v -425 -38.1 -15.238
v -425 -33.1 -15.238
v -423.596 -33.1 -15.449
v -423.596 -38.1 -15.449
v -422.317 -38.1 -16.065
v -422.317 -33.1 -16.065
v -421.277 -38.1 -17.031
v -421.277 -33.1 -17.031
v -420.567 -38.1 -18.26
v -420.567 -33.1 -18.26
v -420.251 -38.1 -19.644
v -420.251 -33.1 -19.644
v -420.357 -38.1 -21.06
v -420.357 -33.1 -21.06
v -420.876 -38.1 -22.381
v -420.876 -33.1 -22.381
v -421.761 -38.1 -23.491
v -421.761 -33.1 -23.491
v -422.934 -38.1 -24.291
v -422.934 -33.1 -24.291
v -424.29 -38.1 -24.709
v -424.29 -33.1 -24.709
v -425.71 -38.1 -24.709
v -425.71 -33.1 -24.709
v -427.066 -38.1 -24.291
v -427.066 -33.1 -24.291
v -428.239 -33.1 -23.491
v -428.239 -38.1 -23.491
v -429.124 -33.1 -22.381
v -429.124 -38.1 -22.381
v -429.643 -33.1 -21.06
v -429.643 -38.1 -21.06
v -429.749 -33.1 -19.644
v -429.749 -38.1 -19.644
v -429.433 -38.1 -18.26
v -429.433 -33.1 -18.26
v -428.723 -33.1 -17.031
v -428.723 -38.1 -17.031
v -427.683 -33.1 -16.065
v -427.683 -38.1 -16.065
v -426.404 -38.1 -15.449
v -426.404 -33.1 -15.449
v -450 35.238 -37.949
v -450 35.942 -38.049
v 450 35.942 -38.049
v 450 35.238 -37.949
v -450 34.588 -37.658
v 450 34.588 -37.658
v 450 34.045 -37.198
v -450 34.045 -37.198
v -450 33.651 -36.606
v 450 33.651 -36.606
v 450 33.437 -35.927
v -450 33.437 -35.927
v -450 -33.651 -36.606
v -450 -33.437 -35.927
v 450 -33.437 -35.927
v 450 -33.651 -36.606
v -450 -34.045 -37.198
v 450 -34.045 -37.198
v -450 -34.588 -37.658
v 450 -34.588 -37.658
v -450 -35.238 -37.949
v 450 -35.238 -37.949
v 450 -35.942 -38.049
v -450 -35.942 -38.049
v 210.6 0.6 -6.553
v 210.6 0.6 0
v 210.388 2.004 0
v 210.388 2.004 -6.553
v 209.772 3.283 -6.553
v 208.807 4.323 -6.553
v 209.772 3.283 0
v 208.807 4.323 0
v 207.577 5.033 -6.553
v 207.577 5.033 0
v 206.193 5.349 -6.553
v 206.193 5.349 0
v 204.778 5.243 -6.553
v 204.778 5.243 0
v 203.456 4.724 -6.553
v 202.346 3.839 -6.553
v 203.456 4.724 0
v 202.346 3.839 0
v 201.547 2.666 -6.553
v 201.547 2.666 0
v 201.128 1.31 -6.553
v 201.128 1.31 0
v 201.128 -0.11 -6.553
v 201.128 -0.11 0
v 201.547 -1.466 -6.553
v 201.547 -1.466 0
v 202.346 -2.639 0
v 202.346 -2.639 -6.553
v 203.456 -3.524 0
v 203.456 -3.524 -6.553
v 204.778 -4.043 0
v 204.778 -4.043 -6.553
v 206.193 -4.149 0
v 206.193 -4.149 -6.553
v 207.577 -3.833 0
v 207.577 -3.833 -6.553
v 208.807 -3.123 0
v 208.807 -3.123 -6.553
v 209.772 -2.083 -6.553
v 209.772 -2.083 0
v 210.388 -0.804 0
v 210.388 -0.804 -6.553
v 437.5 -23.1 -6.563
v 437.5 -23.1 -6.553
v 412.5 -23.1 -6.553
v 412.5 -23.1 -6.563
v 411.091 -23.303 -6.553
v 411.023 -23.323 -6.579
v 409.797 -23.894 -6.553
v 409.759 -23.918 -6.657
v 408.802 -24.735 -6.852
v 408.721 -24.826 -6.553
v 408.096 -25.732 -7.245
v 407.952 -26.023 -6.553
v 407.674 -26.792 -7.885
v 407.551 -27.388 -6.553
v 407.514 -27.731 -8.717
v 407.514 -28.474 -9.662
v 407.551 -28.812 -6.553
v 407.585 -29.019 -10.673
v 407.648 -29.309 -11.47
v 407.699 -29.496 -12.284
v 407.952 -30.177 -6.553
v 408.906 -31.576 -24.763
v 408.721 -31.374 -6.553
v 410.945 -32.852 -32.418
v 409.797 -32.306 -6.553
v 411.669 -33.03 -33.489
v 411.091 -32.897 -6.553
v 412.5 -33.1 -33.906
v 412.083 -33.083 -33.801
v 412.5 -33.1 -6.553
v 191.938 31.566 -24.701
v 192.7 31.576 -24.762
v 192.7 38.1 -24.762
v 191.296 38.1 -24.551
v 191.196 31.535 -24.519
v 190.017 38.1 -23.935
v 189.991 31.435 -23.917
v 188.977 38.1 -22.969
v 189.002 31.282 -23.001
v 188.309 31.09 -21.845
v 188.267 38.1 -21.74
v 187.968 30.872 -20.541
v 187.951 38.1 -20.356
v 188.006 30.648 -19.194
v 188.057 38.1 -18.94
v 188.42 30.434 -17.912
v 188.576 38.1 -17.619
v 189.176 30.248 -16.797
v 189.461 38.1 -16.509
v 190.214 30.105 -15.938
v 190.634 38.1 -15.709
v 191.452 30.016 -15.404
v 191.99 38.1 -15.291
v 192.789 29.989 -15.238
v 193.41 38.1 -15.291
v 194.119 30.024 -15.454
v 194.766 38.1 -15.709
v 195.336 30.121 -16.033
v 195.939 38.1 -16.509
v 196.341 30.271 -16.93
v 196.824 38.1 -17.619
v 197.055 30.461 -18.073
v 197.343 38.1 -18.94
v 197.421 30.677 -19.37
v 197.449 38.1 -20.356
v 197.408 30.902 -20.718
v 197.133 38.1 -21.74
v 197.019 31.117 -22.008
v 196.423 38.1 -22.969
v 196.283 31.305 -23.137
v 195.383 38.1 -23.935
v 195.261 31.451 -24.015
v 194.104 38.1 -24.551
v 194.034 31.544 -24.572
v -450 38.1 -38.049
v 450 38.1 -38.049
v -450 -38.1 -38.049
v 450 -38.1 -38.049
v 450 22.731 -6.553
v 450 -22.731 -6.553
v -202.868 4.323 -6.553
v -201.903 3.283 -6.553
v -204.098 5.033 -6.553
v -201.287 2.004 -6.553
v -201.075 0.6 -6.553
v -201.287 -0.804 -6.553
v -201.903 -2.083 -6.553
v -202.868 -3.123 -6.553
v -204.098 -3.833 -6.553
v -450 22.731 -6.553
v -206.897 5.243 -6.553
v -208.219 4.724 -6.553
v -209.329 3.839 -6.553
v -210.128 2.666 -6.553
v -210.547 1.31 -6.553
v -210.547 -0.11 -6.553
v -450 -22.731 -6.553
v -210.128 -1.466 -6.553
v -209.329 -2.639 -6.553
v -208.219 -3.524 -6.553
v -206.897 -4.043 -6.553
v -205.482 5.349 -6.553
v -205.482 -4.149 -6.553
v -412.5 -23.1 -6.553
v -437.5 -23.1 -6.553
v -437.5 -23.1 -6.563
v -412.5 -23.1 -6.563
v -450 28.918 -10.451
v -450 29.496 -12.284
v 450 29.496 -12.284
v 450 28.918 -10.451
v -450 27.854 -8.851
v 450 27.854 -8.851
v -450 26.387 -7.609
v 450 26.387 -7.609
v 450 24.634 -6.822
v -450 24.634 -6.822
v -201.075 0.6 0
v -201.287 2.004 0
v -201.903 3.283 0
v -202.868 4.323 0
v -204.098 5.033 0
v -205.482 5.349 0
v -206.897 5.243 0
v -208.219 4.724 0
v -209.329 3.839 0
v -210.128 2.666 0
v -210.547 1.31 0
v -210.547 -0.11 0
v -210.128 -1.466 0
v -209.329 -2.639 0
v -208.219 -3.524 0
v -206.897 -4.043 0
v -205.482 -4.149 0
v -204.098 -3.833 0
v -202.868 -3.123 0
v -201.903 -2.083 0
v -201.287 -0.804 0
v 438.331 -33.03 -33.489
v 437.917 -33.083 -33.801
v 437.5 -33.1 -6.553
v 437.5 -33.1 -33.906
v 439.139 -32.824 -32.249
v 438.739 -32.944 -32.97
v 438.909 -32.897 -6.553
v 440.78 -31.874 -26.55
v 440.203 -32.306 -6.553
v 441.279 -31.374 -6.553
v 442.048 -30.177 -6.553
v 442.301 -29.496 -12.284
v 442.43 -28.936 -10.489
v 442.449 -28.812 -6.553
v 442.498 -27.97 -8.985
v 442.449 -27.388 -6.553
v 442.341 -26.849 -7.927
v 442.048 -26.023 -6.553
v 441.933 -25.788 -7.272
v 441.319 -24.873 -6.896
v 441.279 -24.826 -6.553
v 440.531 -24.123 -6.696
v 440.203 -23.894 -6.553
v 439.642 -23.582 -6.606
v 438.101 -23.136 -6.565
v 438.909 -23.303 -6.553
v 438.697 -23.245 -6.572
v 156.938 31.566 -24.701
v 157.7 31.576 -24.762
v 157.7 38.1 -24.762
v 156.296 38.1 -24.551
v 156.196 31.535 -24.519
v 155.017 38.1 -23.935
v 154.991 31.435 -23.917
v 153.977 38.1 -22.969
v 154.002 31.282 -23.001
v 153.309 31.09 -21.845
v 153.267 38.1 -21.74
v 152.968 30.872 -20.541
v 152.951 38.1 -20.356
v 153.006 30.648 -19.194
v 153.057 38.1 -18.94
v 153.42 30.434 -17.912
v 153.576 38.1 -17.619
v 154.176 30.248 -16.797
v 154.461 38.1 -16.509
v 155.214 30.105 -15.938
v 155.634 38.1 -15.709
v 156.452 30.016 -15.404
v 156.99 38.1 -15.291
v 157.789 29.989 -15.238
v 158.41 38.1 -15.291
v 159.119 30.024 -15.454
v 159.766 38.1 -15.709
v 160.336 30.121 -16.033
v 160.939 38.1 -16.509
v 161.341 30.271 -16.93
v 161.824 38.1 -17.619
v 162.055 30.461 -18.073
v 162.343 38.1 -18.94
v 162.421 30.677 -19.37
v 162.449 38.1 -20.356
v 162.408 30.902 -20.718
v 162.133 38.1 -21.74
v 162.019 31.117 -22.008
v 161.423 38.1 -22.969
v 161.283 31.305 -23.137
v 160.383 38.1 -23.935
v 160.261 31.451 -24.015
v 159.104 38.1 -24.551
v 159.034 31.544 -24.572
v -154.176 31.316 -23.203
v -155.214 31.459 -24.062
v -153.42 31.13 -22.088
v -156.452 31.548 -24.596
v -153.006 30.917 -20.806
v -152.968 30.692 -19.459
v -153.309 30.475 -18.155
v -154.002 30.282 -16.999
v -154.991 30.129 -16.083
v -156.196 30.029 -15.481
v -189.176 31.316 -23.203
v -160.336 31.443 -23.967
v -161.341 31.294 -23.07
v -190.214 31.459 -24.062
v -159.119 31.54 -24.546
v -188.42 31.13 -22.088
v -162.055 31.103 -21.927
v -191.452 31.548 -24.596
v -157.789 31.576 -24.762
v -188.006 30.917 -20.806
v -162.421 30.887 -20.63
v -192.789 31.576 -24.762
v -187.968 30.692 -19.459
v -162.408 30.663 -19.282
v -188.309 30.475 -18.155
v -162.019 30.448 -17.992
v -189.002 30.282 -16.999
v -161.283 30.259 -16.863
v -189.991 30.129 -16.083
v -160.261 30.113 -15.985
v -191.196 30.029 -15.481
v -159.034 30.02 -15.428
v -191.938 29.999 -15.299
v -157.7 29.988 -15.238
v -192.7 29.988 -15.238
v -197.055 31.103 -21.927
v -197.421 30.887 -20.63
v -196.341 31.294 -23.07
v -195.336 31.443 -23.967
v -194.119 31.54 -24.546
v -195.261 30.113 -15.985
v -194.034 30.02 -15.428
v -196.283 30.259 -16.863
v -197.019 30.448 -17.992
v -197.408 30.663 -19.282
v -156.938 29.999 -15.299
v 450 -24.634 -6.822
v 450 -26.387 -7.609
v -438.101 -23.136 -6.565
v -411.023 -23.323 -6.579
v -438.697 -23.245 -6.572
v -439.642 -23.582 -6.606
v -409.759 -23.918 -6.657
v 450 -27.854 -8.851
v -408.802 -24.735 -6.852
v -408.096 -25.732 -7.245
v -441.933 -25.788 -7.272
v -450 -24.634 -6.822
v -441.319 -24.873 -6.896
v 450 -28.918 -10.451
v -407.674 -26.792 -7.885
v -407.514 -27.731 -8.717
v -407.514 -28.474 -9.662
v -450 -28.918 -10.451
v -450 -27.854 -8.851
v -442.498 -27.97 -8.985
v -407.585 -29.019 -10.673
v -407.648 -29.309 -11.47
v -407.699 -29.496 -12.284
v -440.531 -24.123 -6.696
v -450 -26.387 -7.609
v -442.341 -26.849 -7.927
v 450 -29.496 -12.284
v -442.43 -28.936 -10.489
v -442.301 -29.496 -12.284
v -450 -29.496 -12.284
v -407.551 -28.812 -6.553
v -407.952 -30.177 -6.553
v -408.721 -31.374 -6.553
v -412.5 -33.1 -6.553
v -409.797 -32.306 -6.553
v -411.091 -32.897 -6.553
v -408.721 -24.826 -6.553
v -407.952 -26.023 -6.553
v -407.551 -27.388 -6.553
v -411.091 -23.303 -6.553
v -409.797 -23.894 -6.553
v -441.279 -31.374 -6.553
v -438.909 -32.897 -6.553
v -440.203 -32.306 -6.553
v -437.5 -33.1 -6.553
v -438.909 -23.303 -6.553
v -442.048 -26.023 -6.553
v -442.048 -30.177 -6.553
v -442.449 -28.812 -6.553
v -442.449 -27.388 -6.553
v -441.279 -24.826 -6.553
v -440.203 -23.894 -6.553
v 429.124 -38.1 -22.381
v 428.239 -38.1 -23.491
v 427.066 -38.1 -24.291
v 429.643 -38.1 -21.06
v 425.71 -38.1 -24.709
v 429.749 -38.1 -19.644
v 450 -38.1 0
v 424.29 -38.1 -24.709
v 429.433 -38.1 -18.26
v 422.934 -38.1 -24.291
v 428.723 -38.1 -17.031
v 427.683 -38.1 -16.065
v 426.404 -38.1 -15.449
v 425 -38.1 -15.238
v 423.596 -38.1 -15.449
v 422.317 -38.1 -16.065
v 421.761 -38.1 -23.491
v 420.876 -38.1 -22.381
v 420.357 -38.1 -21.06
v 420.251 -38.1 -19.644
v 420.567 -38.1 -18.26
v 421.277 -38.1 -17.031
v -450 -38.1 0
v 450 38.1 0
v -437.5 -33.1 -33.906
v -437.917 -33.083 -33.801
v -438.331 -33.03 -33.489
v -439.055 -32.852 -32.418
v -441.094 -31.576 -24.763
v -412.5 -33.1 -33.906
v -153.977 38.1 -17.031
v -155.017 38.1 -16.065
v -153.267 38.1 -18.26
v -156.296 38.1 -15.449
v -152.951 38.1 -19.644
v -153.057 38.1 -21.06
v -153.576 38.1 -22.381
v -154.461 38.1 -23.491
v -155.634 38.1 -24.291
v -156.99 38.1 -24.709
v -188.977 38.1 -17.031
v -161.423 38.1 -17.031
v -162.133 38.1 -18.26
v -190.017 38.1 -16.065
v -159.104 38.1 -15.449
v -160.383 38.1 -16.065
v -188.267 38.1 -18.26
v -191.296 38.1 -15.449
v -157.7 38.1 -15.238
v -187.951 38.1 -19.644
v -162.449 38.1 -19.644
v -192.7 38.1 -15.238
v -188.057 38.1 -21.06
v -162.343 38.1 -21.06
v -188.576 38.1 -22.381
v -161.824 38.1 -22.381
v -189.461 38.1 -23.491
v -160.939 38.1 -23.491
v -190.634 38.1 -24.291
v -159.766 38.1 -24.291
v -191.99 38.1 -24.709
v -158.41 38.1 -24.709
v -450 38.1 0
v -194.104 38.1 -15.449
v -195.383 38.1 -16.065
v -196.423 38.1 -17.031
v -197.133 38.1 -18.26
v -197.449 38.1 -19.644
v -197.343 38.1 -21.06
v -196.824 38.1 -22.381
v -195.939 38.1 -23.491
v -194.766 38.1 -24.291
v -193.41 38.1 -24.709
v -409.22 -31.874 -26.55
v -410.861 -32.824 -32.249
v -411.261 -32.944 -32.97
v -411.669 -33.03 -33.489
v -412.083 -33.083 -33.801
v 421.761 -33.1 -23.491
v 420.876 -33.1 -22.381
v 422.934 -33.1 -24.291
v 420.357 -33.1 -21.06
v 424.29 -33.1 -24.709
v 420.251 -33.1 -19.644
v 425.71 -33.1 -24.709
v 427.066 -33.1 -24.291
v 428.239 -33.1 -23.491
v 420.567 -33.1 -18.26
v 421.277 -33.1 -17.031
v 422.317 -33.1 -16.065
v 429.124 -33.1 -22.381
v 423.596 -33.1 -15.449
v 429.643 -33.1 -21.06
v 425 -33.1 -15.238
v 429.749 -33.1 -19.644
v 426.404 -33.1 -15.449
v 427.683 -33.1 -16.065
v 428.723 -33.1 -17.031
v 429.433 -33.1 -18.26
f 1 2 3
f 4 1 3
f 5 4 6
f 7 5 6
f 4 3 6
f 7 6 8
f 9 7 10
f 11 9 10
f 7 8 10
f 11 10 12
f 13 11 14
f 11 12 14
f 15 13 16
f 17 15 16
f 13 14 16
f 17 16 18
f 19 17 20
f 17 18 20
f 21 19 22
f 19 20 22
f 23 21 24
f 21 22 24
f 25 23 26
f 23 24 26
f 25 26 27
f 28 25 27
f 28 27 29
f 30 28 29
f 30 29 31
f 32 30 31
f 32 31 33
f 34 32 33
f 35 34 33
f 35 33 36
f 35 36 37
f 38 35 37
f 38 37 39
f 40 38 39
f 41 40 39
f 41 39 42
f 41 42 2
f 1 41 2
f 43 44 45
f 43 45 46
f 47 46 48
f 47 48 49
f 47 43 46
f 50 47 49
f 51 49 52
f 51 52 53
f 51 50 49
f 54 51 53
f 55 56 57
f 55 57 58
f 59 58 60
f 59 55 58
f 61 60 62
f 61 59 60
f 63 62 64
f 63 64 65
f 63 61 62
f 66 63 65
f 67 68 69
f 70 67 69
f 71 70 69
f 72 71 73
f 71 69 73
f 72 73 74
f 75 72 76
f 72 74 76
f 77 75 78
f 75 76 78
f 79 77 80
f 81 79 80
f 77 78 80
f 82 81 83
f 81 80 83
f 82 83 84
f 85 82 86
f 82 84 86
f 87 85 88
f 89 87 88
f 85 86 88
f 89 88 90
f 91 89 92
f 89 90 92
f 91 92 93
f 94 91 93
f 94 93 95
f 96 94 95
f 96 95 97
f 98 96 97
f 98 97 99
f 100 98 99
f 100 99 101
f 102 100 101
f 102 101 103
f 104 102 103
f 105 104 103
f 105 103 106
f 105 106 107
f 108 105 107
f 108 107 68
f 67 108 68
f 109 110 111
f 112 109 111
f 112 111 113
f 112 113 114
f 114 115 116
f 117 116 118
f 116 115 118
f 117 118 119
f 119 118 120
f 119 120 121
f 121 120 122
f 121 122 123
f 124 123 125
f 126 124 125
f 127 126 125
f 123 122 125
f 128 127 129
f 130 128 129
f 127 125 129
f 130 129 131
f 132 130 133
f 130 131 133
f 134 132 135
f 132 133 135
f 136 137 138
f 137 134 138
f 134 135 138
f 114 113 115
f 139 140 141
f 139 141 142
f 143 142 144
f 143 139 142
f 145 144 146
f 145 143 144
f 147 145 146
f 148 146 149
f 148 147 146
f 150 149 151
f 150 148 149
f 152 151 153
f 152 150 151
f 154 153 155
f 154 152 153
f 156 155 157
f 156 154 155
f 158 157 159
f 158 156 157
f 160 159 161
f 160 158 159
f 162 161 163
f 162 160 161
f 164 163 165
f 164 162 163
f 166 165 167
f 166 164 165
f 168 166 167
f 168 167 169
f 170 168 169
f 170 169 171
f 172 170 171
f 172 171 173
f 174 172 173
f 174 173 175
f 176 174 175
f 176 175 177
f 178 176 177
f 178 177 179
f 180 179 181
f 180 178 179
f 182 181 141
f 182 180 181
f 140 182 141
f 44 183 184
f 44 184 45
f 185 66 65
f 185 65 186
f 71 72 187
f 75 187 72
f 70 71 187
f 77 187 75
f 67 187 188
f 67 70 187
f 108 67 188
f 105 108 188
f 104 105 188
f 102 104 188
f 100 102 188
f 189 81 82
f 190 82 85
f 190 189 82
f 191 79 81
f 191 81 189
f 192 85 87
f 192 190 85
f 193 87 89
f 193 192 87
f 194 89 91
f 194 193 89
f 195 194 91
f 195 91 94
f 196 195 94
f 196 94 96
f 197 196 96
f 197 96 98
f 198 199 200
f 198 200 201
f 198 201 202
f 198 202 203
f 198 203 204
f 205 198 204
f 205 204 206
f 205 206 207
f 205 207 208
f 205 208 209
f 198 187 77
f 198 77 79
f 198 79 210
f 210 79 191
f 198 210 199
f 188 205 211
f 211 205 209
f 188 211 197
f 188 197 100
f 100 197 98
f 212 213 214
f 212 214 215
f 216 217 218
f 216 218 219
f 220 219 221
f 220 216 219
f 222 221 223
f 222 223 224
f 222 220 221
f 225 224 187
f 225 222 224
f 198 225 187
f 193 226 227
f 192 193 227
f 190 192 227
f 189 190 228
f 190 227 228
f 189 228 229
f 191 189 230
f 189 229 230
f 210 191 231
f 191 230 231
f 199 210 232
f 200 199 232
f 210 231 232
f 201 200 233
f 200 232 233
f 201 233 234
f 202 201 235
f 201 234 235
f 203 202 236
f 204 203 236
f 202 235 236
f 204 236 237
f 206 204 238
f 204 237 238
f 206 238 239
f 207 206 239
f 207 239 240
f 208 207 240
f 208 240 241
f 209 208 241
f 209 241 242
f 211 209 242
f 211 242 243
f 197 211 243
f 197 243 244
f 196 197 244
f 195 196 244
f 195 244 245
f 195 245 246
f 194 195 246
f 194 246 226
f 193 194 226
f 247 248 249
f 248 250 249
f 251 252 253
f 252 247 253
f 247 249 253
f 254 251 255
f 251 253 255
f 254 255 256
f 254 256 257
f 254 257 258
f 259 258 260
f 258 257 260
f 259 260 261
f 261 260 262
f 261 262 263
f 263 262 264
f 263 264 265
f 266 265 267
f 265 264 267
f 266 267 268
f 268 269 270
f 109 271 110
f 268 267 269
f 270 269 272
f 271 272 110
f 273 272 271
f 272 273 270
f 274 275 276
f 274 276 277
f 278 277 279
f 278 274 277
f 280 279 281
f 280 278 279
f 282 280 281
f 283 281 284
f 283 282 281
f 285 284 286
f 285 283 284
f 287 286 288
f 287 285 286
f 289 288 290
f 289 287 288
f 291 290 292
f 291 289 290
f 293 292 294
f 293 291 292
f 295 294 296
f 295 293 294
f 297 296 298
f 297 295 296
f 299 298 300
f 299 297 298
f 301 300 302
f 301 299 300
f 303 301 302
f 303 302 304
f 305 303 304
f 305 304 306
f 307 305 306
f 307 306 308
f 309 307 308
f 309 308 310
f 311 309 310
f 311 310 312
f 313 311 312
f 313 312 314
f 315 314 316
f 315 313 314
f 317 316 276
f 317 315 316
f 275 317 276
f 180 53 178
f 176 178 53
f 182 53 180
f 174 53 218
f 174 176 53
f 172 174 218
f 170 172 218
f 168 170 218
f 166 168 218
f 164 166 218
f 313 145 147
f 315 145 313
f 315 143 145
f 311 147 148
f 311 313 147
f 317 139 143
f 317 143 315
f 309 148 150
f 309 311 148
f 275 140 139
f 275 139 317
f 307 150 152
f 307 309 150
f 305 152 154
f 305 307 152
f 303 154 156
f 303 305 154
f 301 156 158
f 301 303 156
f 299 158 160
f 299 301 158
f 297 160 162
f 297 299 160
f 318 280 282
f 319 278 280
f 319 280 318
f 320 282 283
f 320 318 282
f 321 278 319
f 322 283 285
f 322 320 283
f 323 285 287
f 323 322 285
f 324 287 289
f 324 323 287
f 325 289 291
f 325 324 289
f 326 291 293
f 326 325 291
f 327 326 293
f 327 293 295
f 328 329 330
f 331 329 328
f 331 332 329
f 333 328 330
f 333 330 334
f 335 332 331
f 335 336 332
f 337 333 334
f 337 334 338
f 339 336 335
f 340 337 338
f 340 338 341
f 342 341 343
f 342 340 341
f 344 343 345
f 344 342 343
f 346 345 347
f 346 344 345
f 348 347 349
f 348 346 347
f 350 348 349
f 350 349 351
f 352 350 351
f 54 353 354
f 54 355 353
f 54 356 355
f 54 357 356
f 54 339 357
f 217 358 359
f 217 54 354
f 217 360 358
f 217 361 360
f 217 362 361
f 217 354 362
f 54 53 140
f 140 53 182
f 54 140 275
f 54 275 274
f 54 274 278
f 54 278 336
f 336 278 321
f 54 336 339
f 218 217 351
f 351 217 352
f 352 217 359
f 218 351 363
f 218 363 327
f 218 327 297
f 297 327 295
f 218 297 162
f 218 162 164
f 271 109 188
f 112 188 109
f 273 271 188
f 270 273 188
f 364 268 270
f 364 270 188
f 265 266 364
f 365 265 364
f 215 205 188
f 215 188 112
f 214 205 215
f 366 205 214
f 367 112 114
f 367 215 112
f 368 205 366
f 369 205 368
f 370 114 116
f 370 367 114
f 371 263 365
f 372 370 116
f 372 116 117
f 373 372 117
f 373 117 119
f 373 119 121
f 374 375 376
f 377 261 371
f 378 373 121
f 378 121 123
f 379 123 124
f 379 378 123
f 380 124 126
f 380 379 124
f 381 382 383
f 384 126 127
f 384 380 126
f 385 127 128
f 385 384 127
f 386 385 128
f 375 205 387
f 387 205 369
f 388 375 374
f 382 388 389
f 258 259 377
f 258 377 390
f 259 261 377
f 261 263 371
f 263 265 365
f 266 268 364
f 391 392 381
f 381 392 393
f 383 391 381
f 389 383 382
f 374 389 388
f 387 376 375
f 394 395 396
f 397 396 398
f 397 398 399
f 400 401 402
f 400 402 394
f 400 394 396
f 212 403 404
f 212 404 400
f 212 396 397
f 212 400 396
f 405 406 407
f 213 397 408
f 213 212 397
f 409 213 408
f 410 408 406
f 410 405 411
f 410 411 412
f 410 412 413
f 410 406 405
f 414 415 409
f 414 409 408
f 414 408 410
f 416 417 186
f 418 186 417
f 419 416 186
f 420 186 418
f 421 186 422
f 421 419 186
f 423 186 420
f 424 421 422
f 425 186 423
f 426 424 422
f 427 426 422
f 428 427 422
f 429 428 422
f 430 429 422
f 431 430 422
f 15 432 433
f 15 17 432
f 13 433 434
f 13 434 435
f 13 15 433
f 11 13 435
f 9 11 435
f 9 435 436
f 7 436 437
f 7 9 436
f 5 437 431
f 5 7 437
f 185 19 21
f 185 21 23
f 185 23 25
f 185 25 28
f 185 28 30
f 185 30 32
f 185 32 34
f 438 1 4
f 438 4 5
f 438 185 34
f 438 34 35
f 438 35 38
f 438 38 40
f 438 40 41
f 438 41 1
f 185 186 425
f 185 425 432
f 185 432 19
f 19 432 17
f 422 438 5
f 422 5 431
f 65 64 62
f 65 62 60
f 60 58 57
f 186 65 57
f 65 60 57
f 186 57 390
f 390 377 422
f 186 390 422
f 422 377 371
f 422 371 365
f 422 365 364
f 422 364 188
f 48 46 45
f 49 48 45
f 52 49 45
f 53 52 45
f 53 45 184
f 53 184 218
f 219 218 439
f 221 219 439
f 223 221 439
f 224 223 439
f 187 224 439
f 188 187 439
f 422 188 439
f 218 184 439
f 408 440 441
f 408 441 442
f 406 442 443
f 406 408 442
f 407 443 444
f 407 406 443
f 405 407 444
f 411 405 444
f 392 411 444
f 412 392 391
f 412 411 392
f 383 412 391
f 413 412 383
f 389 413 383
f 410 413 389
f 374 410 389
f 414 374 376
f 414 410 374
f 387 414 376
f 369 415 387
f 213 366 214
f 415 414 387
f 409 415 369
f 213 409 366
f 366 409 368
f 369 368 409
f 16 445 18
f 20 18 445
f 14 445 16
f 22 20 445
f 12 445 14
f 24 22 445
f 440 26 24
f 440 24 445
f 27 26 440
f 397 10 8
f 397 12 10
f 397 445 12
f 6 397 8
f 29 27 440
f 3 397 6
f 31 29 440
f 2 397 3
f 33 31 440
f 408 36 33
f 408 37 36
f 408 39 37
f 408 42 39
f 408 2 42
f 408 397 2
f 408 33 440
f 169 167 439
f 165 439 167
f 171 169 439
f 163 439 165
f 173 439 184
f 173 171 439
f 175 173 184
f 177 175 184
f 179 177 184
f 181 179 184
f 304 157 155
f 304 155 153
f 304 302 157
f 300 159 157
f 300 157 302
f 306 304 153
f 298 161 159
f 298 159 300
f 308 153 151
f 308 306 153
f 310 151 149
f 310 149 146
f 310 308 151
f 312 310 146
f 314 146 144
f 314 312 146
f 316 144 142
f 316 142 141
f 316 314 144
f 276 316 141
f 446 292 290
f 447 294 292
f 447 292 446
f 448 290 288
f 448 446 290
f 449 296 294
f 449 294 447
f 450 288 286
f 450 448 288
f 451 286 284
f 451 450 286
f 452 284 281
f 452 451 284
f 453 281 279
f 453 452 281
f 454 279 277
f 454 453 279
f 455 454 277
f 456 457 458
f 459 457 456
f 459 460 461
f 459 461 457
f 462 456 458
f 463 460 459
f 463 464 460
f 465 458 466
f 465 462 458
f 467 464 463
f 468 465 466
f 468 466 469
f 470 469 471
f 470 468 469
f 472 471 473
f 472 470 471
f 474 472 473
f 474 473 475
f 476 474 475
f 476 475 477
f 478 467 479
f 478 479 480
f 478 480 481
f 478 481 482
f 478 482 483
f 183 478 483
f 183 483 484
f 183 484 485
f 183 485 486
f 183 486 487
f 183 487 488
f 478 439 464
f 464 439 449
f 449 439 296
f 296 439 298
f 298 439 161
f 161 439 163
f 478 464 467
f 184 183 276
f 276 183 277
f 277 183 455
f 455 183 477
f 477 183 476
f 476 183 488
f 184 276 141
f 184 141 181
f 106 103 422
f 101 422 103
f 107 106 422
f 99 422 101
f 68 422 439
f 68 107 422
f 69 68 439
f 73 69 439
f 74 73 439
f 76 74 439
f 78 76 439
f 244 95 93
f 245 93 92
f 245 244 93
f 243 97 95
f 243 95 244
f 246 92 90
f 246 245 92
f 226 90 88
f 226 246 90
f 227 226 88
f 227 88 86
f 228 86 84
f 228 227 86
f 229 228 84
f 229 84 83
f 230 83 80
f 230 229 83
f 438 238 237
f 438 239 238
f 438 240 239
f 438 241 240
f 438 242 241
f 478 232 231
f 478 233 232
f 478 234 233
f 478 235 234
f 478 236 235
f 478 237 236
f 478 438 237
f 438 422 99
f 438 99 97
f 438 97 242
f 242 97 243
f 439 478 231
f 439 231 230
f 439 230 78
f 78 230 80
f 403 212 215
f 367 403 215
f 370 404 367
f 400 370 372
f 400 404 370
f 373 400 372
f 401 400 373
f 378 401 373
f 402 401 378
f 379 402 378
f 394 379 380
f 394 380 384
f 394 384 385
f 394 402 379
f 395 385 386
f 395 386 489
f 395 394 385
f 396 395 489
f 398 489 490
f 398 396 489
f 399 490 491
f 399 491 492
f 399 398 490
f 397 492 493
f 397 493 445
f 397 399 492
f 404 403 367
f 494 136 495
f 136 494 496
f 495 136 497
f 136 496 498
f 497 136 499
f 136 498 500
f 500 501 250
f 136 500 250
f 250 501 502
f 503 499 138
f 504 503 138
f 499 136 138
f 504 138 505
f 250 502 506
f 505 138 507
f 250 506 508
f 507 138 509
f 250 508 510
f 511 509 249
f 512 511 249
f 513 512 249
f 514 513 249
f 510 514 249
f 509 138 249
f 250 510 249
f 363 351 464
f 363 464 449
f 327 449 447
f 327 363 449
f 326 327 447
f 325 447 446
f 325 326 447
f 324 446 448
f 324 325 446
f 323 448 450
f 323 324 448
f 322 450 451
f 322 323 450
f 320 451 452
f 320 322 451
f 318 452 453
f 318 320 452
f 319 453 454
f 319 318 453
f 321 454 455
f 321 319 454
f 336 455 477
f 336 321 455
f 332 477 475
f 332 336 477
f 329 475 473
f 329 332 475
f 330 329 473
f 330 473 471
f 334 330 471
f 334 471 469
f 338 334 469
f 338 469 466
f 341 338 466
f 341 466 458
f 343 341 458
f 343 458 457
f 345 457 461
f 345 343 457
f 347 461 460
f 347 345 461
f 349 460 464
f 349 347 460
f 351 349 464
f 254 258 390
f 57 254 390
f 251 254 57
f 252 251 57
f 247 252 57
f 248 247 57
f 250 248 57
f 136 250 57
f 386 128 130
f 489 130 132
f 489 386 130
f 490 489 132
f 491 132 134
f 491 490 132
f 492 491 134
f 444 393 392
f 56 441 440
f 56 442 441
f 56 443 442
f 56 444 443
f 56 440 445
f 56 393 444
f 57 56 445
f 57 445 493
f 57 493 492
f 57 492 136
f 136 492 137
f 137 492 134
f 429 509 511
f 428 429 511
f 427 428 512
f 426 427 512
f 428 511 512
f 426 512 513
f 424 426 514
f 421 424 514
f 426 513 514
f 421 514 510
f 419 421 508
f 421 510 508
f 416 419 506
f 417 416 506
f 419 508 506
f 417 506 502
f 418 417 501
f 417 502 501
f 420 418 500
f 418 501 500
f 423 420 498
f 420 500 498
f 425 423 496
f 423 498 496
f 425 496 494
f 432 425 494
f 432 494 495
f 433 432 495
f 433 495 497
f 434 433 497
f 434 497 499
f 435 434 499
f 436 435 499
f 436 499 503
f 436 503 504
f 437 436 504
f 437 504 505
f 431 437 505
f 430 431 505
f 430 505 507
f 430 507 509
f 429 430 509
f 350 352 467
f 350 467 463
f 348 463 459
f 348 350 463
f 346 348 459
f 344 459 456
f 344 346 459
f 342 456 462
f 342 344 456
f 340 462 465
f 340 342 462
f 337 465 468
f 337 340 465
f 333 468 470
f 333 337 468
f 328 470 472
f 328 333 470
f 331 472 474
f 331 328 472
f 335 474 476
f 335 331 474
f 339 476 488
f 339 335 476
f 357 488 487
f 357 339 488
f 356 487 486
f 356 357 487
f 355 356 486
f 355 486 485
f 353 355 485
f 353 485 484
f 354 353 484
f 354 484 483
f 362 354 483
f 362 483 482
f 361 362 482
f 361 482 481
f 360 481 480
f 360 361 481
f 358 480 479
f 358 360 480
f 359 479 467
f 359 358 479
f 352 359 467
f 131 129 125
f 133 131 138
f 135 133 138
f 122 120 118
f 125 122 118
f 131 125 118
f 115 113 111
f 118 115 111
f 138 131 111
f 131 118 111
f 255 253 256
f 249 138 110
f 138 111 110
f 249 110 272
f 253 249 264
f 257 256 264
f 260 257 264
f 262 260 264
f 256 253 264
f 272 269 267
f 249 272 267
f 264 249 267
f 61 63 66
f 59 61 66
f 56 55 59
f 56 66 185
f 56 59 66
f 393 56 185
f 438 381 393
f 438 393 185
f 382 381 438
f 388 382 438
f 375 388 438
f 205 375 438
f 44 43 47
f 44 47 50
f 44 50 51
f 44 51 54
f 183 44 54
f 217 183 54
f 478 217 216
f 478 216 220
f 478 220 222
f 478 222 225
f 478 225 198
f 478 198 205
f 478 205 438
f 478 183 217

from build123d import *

# Parameters (mm, degrees)
STRUCTURAL_MEMBER1_DEPTH = 900
SKETCH12_R               = 4.7625
CUT_EXTRUDE1_DEPTH       = 454.210052427
CUT_EXTRUDE2_DEPTH       = 40
SKETCH16_R               = 4.7625
CUT_EXTRUDE3_DEPTH       = 454.210052526
SKETCH17_R               = 4.7625
CUT_EXTRUDE4_DEPTH       = 454.210052526


with BuildPart() as part:
    # Sketch11 → Structural Member1 (new body)
    with BuildSketch(Plane(origin=(-450, 0, 0), x_dir=(0, 0, -1), z_dir=(1, 0, 0))):
        with BuildLine():
            Line((0, -38.1), (0, 38.1))
            Line((0, 38.1), (38.0492, 38.1))
            Line((38.0492, 38.1), (38.0492, 35.942335136))
            ThreePointArc((38.0492, 35.942335136), (37.447280466, 34.300554363), (35.926803066, 33.436899509))
            Line((35.926803066, 33.436899509), (12.283671721, 29.496090157))
            ThreePointArc((12.283671721, 29.496090157), (8.178382741, 27.164222052), (6.5532, 22.731413966))
            Line((6.5532, 22.731413966), (6.5532, -22.731413966))
            ThreePointArc((6.5532, -22.731413966), (8.178382741, -27.164222052), (12.283671721, -29.496090157))
            Line((12.283671721, -29.496090157), (35.926803066, -33.436899509))
            ThreePointArc((35.926803066, -33.436899509), (37.447280466, -34.300554363), (38.0492, -35.942335136))
            Line((38.0492, -35.942335136), (38.0492, -38.1))
            Line((38.0492, -38.1), (0, -38.1))
        make_face()
    extrude(amount=STRUCTURAL_MEMBER1_DEPTH)

    # Sketch12 → Cut-Extrude1 (cut, through all)
    with BuildSketch(Plane(origin=(0, 0, 0), x_dir=(1, 0, 0), z_dir=(0, 1, 0))):
        with Locations(Location((-425, 20, 0), (0, 0, 270))):
            Circle(SKETCH12_R)
        with Locations(Location((425, 20, 0), (0, 0, 270))):
            Circle(SKETCH12_R)
    extrude(amount=-CUT_EXTRUDE1_DEPTH, mode=Mode.SUBTRACT)

    # Sketch15 → Cut-Extrude2 (cut)
    with BuildSketch(Plane(origin=(0, 0, -6.5532), x_dir=(-1, 0, 0), z_dir=(0, 0, -1))):
        with BuildLine():
            Line((-412.5, -33.1), (-437.5, -33.1))
            ThreePointArc((-437.5, -33.1), (-442.5, -28.1), (-437.5, -23.1))
            Line((-437.5, -23.1), (-412.5, -23.1))
            ThreePointArc((-412.5, -23.1), (-407.5, -28.1), (-412.5, -33.1))
        make_face()
        with BuildLine():
            Line((412.5, -33.1), (437.5, -33.1))
            ThreePointArc((437.5, -33.1), (442.5, -28.1), (437.5, -23.1))
            Line((437.5, -23.1), (412.5, -23.1))
            ThreePointArc((412.5, -23.1), (407.5, -28.1), (412.5, -33.1))
        make_face()
    extrude(amount=CUT_EXTRUDE2_DEPTH, mode=Mode.SUBTRACT)

    # Sketch16 → Cut-Extrude3 (cut, through all)
    with BuildSketch(Plane(origin=(0, 0, 0), x_dir=(1, 0, 0), z_dir=(0, 1, 0))):
        with Locations(Location((-192.7, 20, 0), (0, 0, 270))):
            Circle(SKETCH16_R)
        with Locations(Location((-157.7, 20, 0), (0, 0, 270))):
            Circle(SKETCH16_R)
        with Locations(Location((157.7, 20, 0), (0, 0, 90))):
            Circle(SKETCH16_R)
        with Locations(Location((192.7, 20, 0), (0, 0, 90))):
            Circle(SKETCH16_R)
    extrude(amount=CUT_EXTRUDE3_DEPTH, mode=Mode.SUBTRACT)

    # Sketch17 → Cut-Extrude4 (cut, through all)
    with BuildSketch(Plane.XY):
        with Locations((205.8375, 0.6)):
            Circle(SKETCH17_R)
        with Locations((-205.8375, 0.6)):
            Circle(SKETCH17_R)
    extrude(amount=-CUT_EXTRUDE4_DEPTH, mode=Mode.SUBTRACT)


solid = part.part
